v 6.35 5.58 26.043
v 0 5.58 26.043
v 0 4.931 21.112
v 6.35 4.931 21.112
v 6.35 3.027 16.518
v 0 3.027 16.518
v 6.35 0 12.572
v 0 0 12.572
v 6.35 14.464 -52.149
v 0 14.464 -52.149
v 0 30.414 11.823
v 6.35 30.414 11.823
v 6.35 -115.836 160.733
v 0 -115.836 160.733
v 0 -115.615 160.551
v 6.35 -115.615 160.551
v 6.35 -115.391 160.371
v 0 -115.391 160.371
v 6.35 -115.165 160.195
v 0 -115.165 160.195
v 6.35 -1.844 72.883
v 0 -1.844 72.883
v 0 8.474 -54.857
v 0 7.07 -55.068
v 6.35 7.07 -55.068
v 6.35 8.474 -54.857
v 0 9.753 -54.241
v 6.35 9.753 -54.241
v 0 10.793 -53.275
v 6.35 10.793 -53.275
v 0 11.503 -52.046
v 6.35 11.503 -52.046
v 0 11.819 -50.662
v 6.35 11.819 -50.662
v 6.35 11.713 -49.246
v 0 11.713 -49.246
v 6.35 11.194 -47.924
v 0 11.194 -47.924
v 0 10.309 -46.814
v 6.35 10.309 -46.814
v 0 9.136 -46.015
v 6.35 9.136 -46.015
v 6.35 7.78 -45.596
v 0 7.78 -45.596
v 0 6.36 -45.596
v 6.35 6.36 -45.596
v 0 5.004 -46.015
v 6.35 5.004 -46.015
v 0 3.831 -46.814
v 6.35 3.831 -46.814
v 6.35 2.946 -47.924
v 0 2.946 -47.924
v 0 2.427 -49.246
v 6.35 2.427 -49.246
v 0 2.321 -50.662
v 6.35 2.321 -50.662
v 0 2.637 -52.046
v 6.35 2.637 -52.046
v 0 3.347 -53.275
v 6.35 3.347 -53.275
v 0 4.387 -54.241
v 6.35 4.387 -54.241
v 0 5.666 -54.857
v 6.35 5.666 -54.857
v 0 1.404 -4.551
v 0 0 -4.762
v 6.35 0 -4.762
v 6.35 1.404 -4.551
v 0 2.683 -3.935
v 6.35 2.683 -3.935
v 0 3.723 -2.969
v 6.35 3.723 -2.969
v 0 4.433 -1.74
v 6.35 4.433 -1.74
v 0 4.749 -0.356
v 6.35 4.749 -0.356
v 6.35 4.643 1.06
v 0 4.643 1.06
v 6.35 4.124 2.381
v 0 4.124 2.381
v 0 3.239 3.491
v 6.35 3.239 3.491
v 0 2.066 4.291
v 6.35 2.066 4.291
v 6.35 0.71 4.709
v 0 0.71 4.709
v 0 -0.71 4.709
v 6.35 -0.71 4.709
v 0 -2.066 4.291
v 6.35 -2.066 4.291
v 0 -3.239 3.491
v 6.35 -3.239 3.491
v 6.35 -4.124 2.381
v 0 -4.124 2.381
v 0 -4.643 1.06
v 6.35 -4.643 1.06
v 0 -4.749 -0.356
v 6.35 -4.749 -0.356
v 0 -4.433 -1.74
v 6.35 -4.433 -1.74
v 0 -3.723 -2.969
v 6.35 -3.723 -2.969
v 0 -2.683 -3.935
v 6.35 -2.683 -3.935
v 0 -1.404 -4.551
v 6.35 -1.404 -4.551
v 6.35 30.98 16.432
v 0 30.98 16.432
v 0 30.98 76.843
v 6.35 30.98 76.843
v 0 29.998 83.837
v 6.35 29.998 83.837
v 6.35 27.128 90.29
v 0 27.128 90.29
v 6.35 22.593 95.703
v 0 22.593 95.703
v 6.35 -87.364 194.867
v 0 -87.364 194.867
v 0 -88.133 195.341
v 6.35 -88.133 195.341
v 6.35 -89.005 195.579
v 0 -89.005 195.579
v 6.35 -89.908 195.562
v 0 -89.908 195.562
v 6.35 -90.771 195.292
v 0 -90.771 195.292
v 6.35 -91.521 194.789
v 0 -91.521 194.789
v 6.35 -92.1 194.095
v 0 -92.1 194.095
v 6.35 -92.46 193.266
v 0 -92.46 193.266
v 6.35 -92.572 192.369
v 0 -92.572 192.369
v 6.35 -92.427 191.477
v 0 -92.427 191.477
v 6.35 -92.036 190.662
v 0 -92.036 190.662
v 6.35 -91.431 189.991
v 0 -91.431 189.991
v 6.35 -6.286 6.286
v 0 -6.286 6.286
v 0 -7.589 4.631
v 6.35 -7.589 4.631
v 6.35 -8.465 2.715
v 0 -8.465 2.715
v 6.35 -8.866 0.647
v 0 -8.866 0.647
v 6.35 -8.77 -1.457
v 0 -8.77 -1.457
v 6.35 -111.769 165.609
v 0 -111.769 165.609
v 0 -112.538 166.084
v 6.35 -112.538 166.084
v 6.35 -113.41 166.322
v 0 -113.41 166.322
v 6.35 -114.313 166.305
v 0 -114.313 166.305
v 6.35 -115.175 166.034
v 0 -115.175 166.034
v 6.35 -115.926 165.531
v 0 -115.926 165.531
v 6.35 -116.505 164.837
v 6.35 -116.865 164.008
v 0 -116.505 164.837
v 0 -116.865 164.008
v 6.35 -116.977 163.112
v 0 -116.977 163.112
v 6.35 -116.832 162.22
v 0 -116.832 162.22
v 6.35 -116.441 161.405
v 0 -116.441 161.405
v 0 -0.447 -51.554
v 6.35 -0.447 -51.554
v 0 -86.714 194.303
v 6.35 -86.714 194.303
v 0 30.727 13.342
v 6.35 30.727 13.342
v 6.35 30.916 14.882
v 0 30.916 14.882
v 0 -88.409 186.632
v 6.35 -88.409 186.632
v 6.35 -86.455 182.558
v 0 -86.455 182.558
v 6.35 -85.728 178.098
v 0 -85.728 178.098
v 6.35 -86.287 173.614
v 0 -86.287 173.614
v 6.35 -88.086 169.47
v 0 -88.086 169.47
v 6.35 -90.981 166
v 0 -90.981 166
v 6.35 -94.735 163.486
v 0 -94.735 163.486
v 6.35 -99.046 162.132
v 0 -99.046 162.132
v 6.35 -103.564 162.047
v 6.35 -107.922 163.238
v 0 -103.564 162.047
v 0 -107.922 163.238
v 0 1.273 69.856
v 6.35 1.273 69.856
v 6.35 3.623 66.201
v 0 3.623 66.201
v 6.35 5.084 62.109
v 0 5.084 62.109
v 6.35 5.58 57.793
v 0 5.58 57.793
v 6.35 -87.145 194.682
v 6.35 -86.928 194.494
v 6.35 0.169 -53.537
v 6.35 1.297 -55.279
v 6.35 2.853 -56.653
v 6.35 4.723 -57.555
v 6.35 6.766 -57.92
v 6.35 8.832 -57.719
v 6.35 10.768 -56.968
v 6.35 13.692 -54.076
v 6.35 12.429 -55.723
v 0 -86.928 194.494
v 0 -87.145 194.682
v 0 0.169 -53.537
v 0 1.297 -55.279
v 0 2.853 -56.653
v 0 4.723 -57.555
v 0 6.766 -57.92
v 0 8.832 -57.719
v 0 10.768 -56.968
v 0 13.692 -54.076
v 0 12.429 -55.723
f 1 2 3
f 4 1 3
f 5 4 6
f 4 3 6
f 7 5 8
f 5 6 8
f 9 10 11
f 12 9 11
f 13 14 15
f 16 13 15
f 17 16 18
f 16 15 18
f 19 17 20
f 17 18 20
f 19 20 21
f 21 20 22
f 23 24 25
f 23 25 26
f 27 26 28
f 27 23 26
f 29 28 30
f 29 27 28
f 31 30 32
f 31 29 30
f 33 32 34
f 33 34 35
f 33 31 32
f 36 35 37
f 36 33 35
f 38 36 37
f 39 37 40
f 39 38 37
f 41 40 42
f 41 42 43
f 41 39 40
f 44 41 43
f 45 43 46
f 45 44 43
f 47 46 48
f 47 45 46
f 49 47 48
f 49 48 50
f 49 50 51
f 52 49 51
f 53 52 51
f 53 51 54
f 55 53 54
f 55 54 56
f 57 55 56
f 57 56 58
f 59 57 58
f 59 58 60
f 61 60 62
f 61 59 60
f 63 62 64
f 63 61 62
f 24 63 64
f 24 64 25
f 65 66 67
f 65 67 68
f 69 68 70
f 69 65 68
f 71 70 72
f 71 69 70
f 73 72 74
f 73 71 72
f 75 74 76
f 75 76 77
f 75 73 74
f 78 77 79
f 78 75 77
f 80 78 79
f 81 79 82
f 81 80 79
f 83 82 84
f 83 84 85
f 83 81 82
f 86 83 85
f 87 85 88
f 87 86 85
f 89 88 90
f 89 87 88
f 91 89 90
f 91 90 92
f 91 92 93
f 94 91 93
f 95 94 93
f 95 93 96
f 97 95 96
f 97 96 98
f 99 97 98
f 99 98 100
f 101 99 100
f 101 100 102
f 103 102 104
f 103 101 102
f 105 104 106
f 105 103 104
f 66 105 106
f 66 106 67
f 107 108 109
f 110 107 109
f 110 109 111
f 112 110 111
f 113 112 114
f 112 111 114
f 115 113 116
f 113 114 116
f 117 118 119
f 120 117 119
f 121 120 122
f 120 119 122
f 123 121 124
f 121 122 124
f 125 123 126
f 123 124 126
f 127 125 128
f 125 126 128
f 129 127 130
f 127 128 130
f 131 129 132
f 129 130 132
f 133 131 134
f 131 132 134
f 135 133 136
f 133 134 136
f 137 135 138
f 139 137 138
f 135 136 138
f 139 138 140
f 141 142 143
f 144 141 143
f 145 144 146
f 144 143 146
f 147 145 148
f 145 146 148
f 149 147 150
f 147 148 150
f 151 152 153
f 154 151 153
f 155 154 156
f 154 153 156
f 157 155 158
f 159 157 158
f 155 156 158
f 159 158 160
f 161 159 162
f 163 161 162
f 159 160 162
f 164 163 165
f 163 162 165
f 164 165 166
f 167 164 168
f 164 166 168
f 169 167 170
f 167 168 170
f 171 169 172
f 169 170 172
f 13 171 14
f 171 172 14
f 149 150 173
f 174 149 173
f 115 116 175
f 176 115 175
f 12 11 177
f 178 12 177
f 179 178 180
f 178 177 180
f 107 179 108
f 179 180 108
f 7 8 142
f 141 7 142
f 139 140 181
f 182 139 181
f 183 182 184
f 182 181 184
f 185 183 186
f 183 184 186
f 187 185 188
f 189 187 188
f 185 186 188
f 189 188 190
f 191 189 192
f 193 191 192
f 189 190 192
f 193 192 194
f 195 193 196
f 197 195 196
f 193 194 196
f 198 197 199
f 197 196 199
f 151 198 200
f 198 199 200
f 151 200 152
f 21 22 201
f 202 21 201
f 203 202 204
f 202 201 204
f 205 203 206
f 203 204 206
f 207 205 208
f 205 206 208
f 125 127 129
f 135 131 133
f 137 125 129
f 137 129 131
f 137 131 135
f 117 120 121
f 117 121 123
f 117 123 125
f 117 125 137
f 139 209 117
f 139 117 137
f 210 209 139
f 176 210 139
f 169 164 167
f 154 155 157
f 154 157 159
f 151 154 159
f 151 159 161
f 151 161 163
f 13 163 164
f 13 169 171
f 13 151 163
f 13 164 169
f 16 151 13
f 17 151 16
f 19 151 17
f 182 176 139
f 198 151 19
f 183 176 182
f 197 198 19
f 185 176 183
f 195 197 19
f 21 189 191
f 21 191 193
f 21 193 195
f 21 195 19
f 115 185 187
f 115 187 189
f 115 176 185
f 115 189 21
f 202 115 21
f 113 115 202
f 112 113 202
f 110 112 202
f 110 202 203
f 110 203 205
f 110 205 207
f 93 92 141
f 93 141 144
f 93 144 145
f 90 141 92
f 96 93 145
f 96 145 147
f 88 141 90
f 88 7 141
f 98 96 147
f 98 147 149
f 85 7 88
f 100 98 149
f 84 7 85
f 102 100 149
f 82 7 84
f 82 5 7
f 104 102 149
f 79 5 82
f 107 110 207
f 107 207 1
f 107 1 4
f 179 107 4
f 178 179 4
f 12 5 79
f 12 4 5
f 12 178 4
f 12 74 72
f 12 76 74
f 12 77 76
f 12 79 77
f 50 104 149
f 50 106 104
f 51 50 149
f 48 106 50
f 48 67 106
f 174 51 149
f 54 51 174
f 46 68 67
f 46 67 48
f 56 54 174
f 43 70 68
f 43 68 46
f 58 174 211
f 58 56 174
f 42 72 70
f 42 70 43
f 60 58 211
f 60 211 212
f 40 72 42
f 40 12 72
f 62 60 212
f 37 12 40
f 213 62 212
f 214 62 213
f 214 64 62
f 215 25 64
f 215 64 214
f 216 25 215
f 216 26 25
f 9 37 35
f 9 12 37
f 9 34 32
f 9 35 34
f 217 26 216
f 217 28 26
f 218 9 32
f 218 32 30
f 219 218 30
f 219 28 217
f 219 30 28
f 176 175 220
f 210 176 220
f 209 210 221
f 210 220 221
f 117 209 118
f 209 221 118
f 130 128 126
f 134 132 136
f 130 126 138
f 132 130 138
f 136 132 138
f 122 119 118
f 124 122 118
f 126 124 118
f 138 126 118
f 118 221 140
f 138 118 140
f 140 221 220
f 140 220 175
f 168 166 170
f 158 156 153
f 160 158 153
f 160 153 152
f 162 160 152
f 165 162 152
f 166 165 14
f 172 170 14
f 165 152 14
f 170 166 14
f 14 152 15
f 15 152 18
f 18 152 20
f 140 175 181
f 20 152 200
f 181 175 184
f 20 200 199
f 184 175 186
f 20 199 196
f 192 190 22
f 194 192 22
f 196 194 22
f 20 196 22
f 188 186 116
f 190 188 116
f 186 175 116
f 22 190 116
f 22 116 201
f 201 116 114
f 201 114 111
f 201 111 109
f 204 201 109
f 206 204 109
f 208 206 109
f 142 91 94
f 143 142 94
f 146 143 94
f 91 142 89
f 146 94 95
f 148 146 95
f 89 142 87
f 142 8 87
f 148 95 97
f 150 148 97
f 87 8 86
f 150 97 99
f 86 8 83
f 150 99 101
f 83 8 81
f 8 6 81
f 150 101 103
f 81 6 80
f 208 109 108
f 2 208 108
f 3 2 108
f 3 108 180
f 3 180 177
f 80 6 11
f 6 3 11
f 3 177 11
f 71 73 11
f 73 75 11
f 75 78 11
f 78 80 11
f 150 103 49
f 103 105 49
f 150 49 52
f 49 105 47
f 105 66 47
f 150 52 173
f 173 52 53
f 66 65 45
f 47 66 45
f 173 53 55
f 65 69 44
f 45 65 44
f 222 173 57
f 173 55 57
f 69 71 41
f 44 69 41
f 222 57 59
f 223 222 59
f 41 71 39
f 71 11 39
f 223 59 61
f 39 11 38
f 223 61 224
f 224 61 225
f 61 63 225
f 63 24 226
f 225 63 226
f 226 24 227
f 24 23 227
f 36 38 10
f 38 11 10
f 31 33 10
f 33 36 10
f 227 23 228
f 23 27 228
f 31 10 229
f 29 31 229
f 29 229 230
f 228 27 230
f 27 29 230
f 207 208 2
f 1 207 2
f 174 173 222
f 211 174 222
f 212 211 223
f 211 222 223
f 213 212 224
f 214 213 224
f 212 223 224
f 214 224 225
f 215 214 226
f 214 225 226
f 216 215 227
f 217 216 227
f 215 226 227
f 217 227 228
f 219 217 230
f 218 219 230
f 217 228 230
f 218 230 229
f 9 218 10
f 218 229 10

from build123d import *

# Parameters (mm, degrees)
SKETCH1_R           = 4.7625
BOSS_EXTRUDE1_DEPTH = 6.35


with BuildPart() as part:
    # Sketch1 → Boss-Extrude1 (new body)
    with BuildSketch(Plane(origin=(0, 0, 0), x_dir=(0, 0, -1), z_dir=(1, 0, 0))):
        with BuildLine():
            Line((1.456949245, -8.769800391), (51.554431531, -0.446978235))
            ThreePointArc((51.554431531, -0.446978235), (57.919565723, 6.766351601), (52.149062737, 14.463646963))
            Line((52.149062737, 14.463646963), (-11.823304022, 30.413749404))
            ThreePointArc((-11.823304022, 30.413749404), (-14.110305141, 30.837620007), (-16.431916133, 30.979615818))
            Line((-16.431916133, 30.979615818), (-76.842742751, 30.979615818))
            ThreePointArc((-76.842742751, 30.979615818), (-87.163314642, 28.788359771), (-95.703176645, 22.59267061))
            Line((-95.703176645, 22.59267061), (-194.302879657, -86.713577057))
            ThreePointArc((-194.302879657, -86.713577057), (-194.588070452, -87.035958133), (-194.866964637, -87.363801663))
            ThreePointArc((-194.866964637, -87.363801663), (-194.462569451, -91.835682088), (-189.990689026, -91.431286902))
            ThreePointArc((-189.990689026, -91.431286902), (-167.631286902, -89.409310974), (-165.609310974, -111.768713098))
            ThreePointArc((-165.609310974, -111.768713098), (-165.204915788, -116.240593522), (-160.733035363, -115.836198337))
            ThreePointArc((-160.733035363, -115.836198337), (-160.46054239, -115.503015314), (-160.194552833, -115.164617763))
            Line((-160.194552833, -115.164617763), (-72.883126037, -1.843568956))
            ThreePointArc((-72.883126037, -1.843568956), (-66.201418924, 3.623376815), (-57.792742751, 5.579615818))
            Line((-57.792742751, 5.579615818), (-26.042742751, 5.579615818))
            ThreePointArc((-26.042742751, 5.579615818), (-18.752623365, 4.129520913), (-12.572358569, 0))
            Line((-12.572358569, 0), (-6.286179285, -6.286179285))
            ThreePointArc((-6.286179285, -6.286179285), (-2.715227273, -8.465201761), (1.456949245, -8.769800391))
        make_face()
        Circle(SKETCH1_R, mode=Mode.SUBTRACT)
        with Locations((50.305617892, 7.069993529)):
            Circle(SKETCH1_R, mode=Mode.SUBTRACT)
    extrude(amount=BOSS_EXTRUDE1_DEPTH)


solid = part.part
